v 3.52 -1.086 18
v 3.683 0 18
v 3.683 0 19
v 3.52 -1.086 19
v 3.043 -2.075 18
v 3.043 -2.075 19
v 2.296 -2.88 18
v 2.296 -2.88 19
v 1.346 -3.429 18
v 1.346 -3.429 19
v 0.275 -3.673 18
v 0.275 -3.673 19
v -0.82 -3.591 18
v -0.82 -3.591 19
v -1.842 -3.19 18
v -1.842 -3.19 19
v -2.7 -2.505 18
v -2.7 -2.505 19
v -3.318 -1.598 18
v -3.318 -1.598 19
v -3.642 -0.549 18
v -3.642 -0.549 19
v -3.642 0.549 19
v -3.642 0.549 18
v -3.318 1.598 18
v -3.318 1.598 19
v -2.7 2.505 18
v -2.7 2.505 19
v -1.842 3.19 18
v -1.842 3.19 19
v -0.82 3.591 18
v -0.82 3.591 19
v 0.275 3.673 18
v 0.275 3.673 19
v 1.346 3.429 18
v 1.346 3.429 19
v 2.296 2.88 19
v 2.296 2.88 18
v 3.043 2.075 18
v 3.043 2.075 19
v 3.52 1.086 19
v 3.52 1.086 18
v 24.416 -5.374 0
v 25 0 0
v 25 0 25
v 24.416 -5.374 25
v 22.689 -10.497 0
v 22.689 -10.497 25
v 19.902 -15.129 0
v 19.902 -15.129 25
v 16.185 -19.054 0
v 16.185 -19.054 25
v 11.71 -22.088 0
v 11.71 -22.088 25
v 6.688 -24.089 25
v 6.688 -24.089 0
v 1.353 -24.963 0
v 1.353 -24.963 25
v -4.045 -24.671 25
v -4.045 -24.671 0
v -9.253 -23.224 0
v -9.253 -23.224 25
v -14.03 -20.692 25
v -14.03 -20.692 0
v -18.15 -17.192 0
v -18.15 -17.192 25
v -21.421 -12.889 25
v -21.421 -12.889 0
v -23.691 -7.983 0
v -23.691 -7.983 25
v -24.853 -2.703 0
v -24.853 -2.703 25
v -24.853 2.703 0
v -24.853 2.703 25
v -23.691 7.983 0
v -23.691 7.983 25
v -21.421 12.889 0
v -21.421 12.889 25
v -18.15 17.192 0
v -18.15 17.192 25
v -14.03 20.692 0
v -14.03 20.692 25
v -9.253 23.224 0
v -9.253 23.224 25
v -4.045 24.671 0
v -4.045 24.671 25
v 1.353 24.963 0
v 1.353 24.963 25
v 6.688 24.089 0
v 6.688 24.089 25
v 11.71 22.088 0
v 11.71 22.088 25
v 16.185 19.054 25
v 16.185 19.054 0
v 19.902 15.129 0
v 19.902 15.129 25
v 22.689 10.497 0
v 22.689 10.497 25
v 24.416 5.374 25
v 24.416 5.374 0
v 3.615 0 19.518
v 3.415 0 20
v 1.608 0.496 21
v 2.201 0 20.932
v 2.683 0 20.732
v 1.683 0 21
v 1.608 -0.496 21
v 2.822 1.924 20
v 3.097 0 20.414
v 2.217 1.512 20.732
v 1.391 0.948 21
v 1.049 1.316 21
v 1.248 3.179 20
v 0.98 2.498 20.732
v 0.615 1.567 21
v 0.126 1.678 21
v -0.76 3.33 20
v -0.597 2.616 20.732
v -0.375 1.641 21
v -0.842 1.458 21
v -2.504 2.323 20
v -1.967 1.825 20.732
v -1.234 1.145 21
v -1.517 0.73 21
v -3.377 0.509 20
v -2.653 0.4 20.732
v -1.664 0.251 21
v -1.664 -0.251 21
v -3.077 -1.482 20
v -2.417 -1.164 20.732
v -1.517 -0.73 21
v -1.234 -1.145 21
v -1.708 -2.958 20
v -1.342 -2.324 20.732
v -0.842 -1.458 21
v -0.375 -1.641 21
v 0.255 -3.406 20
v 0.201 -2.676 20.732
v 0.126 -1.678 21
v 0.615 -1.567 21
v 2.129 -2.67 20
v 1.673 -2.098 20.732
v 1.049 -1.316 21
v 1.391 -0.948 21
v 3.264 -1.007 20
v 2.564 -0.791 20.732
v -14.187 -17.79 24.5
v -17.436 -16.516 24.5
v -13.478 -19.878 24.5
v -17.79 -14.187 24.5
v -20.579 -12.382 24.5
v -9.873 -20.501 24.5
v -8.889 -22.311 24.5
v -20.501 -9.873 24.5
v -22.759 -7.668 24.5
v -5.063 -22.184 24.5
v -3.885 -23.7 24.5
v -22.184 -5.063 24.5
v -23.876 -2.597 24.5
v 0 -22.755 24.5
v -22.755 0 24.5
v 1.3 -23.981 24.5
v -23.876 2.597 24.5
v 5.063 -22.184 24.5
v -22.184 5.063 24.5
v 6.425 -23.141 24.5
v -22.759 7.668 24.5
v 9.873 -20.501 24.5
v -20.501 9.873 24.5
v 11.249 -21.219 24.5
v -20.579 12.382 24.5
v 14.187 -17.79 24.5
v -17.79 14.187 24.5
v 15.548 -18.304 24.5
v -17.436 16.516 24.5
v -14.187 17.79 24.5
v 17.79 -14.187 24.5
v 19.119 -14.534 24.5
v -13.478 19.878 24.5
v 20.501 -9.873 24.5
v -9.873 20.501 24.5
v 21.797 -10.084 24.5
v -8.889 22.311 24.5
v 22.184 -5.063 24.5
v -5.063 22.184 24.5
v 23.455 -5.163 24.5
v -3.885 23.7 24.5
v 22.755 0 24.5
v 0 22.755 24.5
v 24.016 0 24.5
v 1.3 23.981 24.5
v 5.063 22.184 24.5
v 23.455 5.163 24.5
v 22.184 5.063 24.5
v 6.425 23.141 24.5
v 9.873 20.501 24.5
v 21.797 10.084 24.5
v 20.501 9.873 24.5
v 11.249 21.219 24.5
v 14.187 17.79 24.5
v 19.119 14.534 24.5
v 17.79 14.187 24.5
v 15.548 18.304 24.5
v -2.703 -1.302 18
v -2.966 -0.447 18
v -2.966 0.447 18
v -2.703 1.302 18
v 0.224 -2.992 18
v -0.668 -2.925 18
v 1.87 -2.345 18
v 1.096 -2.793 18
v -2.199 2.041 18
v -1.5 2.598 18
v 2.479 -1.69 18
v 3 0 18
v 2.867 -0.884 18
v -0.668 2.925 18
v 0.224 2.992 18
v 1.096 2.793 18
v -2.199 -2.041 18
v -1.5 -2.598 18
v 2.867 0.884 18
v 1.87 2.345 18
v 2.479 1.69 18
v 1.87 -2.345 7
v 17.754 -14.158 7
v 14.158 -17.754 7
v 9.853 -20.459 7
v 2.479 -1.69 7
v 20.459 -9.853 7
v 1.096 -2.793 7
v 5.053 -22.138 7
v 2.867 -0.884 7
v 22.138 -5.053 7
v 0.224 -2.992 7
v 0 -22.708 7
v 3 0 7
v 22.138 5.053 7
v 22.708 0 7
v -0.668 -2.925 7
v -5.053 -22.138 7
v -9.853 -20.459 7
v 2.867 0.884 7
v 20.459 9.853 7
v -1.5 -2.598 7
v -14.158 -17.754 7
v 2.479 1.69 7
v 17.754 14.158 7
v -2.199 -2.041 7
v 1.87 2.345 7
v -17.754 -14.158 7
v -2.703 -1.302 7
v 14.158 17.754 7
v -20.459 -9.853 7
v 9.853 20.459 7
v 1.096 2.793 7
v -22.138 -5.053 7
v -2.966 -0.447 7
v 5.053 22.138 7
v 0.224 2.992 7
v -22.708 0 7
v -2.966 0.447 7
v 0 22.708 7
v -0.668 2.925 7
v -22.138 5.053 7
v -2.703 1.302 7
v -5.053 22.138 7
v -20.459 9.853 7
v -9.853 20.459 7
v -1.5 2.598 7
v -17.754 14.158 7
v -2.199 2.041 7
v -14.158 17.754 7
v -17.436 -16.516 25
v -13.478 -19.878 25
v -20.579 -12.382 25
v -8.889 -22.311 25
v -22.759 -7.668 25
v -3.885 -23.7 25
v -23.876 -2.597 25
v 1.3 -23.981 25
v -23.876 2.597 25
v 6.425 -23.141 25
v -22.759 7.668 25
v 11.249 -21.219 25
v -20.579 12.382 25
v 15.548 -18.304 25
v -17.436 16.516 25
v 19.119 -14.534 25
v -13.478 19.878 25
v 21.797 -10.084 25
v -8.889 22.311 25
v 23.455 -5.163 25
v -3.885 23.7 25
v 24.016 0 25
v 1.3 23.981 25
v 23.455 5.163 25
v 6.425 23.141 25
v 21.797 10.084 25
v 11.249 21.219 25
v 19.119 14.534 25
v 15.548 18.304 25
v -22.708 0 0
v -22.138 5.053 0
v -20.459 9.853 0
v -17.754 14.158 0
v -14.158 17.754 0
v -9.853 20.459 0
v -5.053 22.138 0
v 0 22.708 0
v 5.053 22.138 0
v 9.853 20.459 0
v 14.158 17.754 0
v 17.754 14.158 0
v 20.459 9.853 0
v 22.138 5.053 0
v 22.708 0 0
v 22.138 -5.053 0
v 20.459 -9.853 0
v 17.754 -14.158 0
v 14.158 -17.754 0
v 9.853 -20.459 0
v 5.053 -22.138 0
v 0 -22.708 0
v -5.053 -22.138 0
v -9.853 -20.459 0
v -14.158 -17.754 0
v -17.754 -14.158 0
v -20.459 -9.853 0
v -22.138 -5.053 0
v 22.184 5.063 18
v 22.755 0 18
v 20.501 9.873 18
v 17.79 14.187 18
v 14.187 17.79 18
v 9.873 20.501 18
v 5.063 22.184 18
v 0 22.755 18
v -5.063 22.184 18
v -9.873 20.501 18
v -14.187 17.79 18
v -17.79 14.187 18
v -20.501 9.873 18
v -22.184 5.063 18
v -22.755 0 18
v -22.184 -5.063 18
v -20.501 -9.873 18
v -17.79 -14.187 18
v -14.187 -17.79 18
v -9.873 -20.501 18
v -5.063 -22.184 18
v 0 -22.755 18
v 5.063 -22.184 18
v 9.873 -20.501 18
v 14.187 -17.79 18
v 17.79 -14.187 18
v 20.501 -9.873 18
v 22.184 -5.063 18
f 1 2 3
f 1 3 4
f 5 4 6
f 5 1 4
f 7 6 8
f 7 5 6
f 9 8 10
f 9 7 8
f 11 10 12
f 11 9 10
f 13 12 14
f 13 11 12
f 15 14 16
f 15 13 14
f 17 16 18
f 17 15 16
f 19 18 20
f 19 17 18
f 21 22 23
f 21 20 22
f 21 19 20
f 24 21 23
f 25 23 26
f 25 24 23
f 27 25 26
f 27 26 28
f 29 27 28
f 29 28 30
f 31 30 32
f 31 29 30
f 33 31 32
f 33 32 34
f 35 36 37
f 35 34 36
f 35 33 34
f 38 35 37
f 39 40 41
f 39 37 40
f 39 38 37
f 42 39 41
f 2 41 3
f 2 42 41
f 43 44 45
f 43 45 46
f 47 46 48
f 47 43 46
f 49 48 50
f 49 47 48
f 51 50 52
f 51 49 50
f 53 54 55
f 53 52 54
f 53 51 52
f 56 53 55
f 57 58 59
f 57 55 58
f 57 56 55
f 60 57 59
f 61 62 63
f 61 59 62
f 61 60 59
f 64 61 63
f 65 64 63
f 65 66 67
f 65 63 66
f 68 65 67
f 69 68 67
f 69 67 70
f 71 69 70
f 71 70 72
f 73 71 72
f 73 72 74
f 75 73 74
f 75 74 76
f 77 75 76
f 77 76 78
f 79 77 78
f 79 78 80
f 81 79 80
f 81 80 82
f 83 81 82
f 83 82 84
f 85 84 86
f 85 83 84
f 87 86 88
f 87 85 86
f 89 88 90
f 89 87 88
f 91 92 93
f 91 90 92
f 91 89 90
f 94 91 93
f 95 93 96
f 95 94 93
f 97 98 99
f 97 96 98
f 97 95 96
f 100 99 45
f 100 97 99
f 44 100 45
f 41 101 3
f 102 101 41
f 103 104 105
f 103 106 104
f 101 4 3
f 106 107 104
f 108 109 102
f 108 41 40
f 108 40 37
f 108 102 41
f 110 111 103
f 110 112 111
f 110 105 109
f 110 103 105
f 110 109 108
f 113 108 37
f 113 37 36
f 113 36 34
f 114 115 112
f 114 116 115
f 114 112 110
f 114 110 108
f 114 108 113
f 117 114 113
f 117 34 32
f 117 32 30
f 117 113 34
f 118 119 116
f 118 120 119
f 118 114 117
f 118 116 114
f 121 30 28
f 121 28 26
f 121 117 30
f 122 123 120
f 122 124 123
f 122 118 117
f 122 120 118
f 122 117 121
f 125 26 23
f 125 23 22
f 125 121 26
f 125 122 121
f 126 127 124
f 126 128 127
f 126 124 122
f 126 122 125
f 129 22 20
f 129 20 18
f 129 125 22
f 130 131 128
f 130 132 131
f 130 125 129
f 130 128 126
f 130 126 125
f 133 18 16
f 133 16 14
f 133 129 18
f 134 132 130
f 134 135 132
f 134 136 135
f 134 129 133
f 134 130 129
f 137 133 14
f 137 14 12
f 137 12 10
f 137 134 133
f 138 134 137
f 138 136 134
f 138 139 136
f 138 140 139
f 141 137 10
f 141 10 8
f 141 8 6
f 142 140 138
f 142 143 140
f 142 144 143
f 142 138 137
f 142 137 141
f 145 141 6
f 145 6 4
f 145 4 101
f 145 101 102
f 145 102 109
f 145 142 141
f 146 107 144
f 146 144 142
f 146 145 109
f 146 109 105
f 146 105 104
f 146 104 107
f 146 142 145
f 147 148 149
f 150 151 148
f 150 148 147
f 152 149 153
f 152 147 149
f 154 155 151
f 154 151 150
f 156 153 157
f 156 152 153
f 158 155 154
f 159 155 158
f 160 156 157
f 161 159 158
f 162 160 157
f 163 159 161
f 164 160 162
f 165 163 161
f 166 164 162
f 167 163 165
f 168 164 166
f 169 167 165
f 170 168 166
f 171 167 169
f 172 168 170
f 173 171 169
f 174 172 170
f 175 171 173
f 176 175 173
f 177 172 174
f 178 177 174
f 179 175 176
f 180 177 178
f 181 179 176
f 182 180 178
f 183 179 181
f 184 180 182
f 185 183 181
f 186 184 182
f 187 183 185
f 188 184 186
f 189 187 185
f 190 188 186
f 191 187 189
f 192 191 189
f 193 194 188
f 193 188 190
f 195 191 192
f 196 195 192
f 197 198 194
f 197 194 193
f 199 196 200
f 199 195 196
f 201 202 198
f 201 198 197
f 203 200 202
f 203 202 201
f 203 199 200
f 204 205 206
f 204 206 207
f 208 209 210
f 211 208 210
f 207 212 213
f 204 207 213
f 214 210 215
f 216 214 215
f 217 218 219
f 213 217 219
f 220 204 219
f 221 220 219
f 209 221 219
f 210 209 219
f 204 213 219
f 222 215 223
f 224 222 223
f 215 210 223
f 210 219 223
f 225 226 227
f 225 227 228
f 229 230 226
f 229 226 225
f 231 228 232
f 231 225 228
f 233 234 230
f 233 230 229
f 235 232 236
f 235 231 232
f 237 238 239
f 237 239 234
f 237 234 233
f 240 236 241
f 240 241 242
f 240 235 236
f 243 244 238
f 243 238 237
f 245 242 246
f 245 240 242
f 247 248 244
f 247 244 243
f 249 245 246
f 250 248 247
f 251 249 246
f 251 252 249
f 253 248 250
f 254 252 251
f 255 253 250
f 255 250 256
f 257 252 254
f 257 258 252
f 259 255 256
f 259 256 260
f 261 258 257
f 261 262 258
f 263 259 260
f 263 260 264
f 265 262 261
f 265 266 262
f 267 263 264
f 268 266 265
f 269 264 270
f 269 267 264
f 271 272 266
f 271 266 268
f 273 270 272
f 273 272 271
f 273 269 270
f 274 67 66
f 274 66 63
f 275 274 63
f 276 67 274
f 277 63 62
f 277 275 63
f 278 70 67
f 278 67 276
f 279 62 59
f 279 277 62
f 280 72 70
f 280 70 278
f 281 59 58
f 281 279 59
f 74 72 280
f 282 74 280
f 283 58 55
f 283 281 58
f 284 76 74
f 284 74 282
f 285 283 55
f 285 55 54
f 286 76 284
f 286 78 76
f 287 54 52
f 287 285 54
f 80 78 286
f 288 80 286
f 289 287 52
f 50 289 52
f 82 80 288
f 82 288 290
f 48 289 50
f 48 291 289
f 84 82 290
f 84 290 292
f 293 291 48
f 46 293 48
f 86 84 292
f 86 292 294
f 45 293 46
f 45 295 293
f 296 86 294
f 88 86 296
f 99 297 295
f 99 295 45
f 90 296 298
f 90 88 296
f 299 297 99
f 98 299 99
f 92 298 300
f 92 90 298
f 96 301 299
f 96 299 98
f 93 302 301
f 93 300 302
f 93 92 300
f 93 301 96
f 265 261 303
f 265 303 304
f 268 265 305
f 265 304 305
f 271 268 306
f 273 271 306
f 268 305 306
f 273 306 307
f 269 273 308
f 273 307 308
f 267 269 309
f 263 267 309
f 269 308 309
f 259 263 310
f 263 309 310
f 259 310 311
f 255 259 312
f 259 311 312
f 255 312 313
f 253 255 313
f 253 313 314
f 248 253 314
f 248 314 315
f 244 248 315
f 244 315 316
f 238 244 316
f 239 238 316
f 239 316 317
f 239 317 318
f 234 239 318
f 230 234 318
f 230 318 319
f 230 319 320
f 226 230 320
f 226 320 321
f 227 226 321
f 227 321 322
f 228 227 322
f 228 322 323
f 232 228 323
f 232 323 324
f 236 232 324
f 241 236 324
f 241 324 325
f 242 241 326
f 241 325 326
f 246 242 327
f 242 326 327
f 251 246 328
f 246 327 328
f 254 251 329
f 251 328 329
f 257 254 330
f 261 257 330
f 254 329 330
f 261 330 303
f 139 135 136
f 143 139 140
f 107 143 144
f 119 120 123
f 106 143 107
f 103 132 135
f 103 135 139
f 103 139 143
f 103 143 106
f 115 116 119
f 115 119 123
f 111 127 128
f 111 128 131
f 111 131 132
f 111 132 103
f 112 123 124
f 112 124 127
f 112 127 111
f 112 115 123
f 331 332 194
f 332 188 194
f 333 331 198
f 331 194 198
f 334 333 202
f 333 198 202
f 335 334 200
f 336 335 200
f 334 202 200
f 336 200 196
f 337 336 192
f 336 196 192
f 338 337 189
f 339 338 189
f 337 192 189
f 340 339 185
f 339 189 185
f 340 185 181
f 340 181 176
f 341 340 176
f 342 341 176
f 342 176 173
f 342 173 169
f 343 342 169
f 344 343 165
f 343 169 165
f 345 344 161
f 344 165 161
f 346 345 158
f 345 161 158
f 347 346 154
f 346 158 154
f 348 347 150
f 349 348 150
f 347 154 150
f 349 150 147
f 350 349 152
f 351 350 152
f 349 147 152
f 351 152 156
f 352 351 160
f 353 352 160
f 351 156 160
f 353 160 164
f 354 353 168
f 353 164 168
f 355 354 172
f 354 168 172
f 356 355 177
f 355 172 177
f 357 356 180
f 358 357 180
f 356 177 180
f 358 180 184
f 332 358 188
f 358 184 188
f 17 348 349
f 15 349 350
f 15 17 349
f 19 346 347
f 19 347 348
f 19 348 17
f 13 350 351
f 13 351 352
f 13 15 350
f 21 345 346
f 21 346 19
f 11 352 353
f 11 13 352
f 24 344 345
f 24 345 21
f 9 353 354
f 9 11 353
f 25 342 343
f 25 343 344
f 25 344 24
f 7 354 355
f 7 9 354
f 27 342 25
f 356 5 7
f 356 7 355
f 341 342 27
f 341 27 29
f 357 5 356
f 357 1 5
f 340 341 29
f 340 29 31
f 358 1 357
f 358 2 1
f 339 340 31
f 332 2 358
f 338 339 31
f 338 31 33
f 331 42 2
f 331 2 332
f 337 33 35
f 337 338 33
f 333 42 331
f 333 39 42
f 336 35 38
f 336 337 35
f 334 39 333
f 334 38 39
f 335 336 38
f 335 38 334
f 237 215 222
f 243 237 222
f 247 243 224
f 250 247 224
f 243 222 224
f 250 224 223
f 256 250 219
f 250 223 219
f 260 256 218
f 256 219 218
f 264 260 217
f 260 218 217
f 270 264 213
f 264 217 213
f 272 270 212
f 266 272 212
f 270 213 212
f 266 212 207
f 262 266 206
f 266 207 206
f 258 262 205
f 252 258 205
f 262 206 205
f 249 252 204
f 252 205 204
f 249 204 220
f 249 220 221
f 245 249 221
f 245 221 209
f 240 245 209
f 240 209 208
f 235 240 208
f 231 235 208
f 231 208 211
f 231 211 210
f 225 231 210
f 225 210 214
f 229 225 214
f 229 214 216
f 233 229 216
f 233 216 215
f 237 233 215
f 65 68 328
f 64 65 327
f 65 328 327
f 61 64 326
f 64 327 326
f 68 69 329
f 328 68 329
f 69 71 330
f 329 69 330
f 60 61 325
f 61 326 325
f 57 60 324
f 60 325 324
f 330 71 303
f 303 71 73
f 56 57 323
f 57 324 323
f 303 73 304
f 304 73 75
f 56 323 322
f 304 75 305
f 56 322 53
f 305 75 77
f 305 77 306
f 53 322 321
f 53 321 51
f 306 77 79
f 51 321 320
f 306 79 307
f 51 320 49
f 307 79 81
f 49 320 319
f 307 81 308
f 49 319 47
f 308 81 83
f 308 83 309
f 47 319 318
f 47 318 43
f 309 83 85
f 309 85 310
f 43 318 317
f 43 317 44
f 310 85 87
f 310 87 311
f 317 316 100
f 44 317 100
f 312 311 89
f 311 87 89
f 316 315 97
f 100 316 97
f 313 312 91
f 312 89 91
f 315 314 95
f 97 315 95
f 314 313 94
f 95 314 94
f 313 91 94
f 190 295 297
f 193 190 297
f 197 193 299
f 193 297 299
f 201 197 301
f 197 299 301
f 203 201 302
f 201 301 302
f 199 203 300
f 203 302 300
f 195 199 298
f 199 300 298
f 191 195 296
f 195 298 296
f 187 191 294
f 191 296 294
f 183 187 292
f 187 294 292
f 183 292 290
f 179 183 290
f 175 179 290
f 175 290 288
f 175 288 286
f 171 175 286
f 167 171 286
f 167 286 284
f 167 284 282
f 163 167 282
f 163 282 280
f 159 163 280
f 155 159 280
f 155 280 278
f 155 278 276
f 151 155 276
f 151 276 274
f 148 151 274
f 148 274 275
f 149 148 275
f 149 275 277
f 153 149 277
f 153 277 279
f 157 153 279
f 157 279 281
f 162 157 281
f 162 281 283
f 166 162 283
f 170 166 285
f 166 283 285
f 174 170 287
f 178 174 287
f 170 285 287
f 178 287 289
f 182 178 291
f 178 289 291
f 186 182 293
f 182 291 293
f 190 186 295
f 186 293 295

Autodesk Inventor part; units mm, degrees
ref_plane "YZ Plane" through (0, 0, 0) normal (1, 0, 0) x (0, 1, 0)
ref_plane "XZ Plane" through (0, 0, 0) normal (0, 1, 0) x (-1, 0, 0)
ref_plane "XY Plane" through (0, 0, 0) normal (0, 0, 1) x (1, 0, 0)
sketch "Sketch1" plane through (0, 0, 0) normal (0, 0, 1) x (1, 0, 0)
  circle A0 centre (0, 0) radius 25
  dimension "d0" = 50
extrude "Extrusion1" add sketch "Sketch1" along normal blind 25
sketch "Sketch2" plane through (0, 0, 25) normal (0, 0, 1) x (1, 0, 0)
  circle A0 centre (0, 0) radius 22.7546
sketch "Sketch3" plane through (0, 0, 0) normal (0, 0, -1) x (-1, 0, 0)
  circle A0 centre (0, 0) radius 22.7077
extrude "Extrusion2" cut sketch "Sketch2" against normal blind 7
extrude "Extrusion3" cut sketch "Sketch3" against normal blind 7
sketch "Sketch4" plane through (0, 0, 25) normal (0, 0, 1) x (1, 0, 0)
  circle A0 centre (0, 0) radius 24.0163
extrude "Extrusion4" cut sketch "Sketch4" against normal blind 0.5
sketch "Sketch5" plane through (0, 0, 18) normal (0, 0, 1) x (1, 0, 0)
  circle A0 centre (0, 0) radius 3
  dimension "d9" = 6
extrude "Extrusion5" cut sketch "Sketch5" against normal blind 25
sketch "Sketch6" plane through (0, 0, 18) normal (0, 0, 1) x (1, 0, 0)
  circle A0 centre (0, 0) radius 3.6832
extrude "Extrusion6" add sketch "Sketch6" along normal blind 3
fillet "Fillet1" radius 2 1 edges at (-3.6832, 0, 21)
sketch "Sketch7" plane through (0, 0, 18) normal (0, 0, 1) x (1, 0, 0)
  point P0 (0, 0)
sketch "Sketch8" plane through (0, 0, 18) normal (0, 0, 1) x (1, 0, 0)
  point P0 (0, 0)
properties part number "WHEEL 2"
